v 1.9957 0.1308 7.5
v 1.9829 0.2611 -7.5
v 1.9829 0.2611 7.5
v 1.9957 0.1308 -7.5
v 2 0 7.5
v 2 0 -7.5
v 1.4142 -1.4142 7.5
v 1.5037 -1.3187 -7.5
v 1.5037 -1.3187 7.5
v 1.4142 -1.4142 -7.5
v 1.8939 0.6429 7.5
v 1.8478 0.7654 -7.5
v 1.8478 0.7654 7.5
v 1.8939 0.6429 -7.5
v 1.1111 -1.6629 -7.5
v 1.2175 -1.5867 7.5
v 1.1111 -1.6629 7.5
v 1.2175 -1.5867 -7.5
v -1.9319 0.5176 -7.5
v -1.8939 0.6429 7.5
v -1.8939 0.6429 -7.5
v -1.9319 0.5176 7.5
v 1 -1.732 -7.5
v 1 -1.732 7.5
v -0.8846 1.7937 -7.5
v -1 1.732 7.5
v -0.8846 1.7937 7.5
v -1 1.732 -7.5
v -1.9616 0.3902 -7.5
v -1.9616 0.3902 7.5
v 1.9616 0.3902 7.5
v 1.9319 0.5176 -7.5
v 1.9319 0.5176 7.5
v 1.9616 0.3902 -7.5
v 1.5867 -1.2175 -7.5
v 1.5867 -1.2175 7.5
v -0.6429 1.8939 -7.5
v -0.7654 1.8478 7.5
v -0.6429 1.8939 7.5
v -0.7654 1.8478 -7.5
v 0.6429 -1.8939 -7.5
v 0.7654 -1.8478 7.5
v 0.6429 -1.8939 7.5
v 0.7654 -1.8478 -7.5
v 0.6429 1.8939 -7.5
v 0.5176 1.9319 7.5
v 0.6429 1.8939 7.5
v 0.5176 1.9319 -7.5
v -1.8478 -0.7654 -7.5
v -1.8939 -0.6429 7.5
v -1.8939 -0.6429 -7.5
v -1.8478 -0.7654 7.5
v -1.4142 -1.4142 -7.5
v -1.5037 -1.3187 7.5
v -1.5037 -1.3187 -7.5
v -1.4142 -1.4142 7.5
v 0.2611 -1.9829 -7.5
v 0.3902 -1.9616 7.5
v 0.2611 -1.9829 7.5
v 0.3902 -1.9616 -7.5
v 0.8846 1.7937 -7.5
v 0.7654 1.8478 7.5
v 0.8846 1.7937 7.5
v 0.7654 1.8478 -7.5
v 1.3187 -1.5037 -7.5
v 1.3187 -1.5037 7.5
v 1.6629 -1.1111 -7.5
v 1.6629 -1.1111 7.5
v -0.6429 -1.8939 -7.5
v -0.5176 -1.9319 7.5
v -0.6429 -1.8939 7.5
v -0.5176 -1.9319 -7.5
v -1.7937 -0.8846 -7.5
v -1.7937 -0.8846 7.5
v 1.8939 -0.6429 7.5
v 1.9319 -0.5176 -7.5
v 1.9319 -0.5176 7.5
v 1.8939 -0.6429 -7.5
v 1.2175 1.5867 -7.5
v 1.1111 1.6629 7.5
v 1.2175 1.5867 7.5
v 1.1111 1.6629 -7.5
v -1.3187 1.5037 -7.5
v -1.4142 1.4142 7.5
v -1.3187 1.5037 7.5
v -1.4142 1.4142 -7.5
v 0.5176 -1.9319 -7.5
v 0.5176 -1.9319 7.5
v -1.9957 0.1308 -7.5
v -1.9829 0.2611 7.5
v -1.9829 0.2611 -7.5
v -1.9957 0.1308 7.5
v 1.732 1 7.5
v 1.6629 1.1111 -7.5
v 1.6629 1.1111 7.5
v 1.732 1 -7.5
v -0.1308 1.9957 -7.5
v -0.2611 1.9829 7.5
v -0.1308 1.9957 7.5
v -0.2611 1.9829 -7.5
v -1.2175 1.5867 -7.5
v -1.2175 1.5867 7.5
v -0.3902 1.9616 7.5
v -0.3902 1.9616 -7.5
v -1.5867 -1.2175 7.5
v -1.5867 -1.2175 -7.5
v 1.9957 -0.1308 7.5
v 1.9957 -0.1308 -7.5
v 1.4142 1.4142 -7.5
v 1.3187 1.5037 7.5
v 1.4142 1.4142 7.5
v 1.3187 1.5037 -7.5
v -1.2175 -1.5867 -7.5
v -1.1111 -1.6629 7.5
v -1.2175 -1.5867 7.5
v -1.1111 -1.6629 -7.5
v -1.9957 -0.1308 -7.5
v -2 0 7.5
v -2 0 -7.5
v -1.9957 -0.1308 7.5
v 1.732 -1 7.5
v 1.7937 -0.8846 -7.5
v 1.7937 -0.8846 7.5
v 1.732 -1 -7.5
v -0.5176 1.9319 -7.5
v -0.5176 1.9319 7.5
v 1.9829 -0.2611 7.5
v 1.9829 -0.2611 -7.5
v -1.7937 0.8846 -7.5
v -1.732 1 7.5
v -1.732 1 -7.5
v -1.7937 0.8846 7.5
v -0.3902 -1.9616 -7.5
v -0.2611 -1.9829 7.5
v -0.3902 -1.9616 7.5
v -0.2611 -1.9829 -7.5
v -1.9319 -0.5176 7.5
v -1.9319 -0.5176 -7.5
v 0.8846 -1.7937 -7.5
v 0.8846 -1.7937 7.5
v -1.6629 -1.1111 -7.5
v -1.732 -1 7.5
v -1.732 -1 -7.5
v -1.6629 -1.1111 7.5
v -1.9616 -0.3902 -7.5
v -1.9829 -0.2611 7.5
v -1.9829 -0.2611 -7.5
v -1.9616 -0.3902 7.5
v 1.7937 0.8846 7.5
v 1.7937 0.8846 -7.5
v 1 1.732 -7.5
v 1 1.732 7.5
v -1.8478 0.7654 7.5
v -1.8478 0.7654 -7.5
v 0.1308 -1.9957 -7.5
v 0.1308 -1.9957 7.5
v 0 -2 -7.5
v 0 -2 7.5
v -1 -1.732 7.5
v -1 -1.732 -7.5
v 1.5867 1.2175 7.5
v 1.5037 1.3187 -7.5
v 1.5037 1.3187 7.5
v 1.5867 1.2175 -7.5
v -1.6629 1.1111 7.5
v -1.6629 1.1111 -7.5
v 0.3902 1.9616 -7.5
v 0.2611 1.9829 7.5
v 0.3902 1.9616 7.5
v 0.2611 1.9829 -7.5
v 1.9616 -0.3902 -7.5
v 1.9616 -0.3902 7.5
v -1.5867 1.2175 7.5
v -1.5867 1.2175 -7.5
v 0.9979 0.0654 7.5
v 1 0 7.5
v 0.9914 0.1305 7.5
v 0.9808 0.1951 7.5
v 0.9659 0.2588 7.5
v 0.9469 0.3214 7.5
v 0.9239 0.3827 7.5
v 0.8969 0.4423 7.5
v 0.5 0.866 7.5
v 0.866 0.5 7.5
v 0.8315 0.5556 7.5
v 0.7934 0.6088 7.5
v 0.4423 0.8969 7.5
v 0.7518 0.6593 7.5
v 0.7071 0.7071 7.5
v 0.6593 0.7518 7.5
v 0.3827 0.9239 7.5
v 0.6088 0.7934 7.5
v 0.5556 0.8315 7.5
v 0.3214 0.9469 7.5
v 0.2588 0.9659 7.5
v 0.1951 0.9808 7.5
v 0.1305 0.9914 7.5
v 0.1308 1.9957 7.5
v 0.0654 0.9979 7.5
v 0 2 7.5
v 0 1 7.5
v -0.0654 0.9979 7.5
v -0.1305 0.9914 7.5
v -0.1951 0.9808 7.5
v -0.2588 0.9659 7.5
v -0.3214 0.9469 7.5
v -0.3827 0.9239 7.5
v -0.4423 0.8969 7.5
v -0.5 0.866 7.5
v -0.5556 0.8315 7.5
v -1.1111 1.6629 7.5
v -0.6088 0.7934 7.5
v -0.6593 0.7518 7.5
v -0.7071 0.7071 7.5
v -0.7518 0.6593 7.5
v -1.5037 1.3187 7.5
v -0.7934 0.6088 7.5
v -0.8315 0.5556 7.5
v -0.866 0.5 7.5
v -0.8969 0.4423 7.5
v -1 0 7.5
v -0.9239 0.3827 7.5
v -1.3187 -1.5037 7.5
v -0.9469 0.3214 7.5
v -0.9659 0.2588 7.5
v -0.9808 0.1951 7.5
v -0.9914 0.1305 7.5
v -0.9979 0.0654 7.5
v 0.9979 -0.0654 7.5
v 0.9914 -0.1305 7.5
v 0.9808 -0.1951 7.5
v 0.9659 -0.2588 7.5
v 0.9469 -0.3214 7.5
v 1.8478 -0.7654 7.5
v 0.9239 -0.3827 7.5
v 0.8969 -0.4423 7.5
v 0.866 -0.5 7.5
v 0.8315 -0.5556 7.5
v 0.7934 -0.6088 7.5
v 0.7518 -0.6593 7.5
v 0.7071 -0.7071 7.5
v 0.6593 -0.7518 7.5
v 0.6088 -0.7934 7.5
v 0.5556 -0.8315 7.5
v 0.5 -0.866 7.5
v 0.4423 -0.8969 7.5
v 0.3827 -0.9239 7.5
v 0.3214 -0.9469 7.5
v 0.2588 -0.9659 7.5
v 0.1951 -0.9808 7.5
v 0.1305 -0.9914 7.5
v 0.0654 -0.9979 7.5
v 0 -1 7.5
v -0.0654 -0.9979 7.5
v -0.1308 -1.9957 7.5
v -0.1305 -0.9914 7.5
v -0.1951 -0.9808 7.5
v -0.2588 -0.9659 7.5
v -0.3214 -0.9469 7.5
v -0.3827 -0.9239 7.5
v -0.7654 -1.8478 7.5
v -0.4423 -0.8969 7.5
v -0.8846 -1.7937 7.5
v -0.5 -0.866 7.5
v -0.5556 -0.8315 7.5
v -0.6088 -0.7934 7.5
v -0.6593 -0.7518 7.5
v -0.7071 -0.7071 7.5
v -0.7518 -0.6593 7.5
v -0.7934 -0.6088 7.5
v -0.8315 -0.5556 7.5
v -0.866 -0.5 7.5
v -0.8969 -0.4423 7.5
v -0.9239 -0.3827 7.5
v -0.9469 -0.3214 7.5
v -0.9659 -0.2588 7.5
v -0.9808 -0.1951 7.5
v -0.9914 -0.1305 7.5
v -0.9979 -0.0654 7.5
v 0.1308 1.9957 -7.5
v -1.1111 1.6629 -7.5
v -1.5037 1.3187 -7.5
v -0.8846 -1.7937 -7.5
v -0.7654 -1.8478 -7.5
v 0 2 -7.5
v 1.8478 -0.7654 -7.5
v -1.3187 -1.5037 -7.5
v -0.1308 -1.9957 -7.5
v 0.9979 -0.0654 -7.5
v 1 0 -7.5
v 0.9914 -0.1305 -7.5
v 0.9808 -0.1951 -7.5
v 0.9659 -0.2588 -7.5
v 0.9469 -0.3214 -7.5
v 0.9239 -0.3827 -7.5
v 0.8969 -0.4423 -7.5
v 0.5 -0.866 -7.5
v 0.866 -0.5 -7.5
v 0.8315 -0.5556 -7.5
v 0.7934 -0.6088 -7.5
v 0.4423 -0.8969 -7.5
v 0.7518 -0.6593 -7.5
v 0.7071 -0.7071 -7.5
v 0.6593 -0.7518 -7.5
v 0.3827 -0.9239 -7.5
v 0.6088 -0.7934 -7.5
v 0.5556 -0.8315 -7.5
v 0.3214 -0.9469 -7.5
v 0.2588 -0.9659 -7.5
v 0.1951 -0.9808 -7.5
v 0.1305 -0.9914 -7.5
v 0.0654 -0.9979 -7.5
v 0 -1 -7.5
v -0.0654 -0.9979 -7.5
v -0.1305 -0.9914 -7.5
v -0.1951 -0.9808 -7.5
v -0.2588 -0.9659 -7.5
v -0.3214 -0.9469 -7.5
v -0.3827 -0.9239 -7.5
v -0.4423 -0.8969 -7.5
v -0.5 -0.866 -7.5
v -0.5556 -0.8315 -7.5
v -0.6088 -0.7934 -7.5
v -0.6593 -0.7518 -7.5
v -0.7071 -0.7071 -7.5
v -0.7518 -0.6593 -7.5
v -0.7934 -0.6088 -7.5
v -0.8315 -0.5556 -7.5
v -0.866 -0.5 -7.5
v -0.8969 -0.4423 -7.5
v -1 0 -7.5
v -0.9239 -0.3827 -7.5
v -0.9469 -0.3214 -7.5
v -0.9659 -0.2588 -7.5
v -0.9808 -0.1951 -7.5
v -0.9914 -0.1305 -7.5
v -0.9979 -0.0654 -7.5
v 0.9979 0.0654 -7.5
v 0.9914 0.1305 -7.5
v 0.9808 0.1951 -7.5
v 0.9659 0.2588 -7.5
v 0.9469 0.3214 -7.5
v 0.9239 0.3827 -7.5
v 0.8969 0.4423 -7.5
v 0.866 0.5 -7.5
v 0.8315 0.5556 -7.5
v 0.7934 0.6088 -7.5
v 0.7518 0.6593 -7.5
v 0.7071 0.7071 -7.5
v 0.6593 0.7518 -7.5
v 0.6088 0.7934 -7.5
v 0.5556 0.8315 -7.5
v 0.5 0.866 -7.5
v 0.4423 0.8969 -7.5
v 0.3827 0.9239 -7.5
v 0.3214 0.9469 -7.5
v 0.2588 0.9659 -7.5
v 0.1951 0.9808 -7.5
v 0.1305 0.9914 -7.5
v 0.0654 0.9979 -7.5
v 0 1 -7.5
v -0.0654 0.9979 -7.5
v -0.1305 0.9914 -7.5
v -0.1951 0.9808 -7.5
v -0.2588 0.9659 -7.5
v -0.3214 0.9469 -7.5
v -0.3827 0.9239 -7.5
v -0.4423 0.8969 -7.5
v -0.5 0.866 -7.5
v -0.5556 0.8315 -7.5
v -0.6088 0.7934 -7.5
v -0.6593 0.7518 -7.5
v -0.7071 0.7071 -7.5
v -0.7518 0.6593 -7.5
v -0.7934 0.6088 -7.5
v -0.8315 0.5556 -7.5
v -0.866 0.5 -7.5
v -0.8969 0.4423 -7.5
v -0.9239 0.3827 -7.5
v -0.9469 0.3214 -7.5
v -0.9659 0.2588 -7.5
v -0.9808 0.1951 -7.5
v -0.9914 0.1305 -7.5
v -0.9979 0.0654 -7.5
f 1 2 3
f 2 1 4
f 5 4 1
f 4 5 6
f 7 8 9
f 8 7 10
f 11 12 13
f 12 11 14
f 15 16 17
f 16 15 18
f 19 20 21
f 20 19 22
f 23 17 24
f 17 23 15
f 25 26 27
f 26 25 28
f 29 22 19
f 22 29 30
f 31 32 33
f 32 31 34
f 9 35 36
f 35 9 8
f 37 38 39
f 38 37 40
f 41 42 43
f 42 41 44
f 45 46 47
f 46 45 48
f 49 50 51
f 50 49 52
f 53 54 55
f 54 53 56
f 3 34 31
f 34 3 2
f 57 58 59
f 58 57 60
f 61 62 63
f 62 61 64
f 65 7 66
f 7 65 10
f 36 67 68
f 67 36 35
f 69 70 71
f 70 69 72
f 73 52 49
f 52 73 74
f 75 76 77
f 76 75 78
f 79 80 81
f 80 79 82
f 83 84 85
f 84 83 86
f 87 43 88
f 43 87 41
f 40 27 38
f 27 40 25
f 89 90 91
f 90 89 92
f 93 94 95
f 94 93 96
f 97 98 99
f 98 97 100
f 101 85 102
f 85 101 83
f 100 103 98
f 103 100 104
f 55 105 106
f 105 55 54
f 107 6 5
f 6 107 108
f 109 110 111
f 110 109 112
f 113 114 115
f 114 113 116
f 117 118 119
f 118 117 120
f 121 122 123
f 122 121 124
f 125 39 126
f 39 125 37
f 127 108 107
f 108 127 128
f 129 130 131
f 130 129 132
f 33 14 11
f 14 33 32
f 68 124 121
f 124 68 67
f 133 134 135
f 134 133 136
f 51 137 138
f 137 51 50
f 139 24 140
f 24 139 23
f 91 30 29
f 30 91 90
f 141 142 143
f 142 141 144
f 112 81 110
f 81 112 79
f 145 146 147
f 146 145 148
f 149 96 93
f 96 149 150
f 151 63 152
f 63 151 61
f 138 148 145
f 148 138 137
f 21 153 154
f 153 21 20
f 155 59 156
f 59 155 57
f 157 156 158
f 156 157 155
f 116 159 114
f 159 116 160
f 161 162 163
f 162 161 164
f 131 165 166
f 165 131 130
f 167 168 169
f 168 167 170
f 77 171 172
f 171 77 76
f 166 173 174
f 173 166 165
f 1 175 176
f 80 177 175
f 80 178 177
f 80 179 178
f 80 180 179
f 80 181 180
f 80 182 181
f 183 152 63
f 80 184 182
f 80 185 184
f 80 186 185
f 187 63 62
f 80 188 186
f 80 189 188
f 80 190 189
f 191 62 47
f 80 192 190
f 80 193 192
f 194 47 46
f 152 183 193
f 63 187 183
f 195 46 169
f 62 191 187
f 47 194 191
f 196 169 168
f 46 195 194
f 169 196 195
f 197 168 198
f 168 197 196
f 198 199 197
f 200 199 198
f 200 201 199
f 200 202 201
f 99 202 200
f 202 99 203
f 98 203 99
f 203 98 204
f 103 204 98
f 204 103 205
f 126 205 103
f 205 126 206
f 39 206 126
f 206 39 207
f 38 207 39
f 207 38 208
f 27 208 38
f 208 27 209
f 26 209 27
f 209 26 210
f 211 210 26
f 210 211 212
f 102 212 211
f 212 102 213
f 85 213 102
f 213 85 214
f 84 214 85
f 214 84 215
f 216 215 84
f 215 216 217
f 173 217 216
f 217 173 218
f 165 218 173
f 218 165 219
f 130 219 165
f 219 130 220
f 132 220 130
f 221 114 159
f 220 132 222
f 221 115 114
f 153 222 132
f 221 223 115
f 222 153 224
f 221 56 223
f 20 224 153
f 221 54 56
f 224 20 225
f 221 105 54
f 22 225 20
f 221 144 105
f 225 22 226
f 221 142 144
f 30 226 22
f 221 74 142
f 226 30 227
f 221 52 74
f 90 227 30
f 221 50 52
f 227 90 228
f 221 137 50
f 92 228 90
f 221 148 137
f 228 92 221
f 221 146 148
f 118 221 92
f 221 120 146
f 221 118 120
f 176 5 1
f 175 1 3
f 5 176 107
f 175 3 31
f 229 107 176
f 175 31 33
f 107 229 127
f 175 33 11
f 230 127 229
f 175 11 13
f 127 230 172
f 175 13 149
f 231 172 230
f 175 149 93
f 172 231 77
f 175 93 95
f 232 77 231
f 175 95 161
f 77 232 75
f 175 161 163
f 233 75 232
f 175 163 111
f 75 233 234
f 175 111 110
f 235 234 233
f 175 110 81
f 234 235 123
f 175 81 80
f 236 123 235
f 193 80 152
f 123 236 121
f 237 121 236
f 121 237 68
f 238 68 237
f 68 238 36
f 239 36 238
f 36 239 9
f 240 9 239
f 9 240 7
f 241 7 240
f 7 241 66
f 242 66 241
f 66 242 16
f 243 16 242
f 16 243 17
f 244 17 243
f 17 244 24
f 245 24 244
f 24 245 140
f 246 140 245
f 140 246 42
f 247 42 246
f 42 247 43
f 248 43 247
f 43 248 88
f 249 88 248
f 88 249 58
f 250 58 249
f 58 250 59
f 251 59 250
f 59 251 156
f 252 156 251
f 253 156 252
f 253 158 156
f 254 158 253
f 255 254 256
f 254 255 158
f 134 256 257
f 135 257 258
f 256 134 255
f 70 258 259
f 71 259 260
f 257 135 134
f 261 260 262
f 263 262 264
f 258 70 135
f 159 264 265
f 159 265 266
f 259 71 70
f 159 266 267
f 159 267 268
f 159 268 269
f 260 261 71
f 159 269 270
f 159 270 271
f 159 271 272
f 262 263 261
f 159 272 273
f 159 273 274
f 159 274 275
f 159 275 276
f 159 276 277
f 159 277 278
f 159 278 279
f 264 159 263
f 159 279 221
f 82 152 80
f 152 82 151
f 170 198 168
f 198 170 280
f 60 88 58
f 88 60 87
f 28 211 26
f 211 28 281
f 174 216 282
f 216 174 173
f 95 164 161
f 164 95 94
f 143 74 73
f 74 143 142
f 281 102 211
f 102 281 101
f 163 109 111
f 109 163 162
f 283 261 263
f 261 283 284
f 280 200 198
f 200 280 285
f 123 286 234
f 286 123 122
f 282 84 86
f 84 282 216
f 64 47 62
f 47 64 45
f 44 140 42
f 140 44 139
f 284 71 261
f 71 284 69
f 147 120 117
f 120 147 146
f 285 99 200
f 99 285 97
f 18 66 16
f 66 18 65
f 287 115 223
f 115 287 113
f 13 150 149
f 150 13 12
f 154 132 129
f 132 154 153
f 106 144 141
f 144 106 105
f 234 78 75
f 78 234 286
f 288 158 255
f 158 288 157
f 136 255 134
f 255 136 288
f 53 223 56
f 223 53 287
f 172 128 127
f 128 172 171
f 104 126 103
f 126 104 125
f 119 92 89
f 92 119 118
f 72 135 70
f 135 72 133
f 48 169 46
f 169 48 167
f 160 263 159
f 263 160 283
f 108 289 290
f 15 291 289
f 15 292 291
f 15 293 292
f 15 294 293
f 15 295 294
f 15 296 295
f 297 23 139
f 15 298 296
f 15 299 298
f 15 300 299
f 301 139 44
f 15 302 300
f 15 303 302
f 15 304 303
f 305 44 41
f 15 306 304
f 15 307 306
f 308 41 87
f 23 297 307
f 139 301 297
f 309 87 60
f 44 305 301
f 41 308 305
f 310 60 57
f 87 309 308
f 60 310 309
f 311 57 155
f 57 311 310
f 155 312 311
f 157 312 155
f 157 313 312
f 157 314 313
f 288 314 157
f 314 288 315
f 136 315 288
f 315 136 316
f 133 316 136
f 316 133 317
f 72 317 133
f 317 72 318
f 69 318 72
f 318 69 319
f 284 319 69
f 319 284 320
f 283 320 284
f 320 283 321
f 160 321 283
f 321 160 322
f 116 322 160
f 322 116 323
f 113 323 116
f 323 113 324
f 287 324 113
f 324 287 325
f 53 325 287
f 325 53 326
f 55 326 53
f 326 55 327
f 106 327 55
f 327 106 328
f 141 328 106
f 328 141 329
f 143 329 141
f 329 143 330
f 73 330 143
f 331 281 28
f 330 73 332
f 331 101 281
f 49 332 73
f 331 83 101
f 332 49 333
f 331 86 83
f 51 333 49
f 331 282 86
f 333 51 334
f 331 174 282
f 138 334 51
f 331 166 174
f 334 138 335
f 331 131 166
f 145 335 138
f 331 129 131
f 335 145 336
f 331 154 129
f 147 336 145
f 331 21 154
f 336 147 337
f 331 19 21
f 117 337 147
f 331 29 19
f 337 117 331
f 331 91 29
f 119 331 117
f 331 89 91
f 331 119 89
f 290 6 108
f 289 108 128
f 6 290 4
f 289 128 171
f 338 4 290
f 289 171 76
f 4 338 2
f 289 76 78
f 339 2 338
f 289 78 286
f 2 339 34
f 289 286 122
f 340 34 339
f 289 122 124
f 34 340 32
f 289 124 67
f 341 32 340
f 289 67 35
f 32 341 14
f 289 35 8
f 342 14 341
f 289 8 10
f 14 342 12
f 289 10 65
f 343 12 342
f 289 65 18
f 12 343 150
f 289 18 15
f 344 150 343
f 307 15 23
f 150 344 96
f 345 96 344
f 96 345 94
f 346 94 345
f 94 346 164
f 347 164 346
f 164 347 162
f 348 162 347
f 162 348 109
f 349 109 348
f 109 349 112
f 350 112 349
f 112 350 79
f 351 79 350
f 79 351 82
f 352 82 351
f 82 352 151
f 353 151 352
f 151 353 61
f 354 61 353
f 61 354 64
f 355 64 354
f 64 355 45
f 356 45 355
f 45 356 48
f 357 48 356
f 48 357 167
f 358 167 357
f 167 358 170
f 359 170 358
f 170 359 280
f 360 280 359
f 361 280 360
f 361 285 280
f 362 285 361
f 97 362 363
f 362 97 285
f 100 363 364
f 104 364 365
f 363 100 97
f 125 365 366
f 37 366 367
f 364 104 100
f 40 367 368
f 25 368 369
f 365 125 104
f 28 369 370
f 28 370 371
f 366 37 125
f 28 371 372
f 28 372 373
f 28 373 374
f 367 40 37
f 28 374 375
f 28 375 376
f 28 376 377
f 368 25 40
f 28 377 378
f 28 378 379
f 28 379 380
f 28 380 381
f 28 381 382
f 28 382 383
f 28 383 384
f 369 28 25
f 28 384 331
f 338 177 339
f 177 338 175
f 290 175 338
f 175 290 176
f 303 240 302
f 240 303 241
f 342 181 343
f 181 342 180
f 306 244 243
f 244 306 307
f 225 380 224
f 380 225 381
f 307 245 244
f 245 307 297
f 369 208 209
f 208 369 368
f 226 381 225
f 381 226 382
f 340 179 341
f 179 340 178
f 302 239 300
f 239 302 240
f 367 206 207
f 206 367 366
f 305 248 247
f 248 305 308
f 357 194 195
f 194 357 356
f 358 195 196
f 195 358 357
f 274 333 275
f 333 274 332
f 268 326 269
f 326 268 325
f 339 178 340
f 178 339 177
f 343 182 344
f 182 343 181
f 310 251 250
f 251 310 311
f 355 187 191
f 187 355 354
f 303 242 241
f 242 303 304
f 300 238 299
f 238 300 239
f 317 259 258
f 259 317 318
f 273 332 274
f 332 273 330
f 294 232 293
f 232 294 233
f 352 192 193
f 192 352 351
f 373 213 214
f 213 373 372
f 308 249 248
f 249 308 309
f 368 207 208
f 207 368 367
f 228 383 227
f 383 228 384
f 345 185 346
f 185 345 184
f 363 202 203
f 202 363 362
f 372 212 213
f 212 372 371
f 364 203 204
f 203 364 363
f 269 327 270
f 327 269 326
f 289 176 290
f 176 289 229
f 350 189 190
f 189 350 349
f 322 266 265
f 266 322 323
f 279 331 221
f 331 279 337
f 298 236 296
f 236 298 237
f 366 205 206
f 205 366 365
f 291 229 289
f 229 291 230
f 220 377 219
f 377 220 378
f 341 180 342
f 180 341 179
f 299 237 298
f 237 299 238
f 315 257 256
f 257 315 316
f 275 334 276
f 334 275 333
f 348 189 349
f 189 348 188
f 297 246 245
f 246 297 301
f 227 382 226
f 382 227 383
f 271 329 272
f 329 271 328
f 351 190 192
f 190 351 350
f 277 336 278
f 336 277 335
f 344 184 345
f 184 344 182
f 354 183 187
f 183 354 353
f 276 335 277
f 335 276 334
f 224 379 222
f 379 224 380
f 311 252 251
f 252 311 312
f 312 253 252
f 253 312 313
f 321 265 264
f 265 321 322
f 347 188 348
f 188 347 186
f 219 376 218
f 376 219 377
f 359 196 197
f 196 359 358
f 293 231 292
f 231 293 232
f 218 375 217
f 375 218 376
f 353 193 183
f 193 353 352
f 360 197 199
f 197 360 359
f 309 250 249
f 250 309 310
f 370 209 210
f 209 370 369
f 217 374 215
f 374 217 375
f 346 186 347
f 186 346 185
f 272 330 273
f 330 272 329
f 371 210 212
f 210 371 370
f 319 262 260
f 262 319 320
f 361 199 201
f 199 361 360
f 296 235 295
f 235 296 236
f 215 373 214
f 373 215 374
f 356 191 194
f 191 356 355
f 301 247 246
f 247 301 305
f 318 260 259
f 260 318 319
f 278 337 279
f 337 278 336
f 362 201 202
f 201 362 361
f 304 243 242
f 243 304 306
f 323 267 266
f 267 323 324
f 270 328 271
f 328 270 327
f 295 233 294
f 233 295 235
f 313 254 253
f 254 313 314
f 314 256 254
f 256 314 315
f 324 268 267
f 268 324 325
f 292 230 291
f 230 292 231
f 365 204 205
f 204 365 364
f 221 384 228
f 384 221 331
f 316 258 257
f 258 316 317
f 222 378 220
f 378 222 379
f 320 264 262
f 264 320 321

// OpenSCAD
// PTFE Tubing (round, hollow cylinder) - fixed centering/visibility

// Parameters
length = 15; //[7.5:30:0.5]
od = 4;      //[2:8:0.1]
id = 2;      //[1:4:0.1]
center = 1;  //[0:1]

$fn = 96; // smooth round tube

module ptfe_tube(len, od, id, centered=true) {
    outer_r = max(0.01, od/2);
    inner_r = min(max(0, id/2), outer_r - 0.01); // ensure non-zero wall
    eps = 0.2;

    color([0.85, 0.85, 0.8])  // off-white PTFE
    difference() {
        cylinder(h=len, r=outer_r, center=centered);
        cylinder(h=len + eps, r=inner_r, center=centered);
    }
}

// Place tube so it is visible whether centered or not
translate([0, 0, center ? 0 : length/2])
    ptfe_tube(length, od, id, centered= (center == 1));
